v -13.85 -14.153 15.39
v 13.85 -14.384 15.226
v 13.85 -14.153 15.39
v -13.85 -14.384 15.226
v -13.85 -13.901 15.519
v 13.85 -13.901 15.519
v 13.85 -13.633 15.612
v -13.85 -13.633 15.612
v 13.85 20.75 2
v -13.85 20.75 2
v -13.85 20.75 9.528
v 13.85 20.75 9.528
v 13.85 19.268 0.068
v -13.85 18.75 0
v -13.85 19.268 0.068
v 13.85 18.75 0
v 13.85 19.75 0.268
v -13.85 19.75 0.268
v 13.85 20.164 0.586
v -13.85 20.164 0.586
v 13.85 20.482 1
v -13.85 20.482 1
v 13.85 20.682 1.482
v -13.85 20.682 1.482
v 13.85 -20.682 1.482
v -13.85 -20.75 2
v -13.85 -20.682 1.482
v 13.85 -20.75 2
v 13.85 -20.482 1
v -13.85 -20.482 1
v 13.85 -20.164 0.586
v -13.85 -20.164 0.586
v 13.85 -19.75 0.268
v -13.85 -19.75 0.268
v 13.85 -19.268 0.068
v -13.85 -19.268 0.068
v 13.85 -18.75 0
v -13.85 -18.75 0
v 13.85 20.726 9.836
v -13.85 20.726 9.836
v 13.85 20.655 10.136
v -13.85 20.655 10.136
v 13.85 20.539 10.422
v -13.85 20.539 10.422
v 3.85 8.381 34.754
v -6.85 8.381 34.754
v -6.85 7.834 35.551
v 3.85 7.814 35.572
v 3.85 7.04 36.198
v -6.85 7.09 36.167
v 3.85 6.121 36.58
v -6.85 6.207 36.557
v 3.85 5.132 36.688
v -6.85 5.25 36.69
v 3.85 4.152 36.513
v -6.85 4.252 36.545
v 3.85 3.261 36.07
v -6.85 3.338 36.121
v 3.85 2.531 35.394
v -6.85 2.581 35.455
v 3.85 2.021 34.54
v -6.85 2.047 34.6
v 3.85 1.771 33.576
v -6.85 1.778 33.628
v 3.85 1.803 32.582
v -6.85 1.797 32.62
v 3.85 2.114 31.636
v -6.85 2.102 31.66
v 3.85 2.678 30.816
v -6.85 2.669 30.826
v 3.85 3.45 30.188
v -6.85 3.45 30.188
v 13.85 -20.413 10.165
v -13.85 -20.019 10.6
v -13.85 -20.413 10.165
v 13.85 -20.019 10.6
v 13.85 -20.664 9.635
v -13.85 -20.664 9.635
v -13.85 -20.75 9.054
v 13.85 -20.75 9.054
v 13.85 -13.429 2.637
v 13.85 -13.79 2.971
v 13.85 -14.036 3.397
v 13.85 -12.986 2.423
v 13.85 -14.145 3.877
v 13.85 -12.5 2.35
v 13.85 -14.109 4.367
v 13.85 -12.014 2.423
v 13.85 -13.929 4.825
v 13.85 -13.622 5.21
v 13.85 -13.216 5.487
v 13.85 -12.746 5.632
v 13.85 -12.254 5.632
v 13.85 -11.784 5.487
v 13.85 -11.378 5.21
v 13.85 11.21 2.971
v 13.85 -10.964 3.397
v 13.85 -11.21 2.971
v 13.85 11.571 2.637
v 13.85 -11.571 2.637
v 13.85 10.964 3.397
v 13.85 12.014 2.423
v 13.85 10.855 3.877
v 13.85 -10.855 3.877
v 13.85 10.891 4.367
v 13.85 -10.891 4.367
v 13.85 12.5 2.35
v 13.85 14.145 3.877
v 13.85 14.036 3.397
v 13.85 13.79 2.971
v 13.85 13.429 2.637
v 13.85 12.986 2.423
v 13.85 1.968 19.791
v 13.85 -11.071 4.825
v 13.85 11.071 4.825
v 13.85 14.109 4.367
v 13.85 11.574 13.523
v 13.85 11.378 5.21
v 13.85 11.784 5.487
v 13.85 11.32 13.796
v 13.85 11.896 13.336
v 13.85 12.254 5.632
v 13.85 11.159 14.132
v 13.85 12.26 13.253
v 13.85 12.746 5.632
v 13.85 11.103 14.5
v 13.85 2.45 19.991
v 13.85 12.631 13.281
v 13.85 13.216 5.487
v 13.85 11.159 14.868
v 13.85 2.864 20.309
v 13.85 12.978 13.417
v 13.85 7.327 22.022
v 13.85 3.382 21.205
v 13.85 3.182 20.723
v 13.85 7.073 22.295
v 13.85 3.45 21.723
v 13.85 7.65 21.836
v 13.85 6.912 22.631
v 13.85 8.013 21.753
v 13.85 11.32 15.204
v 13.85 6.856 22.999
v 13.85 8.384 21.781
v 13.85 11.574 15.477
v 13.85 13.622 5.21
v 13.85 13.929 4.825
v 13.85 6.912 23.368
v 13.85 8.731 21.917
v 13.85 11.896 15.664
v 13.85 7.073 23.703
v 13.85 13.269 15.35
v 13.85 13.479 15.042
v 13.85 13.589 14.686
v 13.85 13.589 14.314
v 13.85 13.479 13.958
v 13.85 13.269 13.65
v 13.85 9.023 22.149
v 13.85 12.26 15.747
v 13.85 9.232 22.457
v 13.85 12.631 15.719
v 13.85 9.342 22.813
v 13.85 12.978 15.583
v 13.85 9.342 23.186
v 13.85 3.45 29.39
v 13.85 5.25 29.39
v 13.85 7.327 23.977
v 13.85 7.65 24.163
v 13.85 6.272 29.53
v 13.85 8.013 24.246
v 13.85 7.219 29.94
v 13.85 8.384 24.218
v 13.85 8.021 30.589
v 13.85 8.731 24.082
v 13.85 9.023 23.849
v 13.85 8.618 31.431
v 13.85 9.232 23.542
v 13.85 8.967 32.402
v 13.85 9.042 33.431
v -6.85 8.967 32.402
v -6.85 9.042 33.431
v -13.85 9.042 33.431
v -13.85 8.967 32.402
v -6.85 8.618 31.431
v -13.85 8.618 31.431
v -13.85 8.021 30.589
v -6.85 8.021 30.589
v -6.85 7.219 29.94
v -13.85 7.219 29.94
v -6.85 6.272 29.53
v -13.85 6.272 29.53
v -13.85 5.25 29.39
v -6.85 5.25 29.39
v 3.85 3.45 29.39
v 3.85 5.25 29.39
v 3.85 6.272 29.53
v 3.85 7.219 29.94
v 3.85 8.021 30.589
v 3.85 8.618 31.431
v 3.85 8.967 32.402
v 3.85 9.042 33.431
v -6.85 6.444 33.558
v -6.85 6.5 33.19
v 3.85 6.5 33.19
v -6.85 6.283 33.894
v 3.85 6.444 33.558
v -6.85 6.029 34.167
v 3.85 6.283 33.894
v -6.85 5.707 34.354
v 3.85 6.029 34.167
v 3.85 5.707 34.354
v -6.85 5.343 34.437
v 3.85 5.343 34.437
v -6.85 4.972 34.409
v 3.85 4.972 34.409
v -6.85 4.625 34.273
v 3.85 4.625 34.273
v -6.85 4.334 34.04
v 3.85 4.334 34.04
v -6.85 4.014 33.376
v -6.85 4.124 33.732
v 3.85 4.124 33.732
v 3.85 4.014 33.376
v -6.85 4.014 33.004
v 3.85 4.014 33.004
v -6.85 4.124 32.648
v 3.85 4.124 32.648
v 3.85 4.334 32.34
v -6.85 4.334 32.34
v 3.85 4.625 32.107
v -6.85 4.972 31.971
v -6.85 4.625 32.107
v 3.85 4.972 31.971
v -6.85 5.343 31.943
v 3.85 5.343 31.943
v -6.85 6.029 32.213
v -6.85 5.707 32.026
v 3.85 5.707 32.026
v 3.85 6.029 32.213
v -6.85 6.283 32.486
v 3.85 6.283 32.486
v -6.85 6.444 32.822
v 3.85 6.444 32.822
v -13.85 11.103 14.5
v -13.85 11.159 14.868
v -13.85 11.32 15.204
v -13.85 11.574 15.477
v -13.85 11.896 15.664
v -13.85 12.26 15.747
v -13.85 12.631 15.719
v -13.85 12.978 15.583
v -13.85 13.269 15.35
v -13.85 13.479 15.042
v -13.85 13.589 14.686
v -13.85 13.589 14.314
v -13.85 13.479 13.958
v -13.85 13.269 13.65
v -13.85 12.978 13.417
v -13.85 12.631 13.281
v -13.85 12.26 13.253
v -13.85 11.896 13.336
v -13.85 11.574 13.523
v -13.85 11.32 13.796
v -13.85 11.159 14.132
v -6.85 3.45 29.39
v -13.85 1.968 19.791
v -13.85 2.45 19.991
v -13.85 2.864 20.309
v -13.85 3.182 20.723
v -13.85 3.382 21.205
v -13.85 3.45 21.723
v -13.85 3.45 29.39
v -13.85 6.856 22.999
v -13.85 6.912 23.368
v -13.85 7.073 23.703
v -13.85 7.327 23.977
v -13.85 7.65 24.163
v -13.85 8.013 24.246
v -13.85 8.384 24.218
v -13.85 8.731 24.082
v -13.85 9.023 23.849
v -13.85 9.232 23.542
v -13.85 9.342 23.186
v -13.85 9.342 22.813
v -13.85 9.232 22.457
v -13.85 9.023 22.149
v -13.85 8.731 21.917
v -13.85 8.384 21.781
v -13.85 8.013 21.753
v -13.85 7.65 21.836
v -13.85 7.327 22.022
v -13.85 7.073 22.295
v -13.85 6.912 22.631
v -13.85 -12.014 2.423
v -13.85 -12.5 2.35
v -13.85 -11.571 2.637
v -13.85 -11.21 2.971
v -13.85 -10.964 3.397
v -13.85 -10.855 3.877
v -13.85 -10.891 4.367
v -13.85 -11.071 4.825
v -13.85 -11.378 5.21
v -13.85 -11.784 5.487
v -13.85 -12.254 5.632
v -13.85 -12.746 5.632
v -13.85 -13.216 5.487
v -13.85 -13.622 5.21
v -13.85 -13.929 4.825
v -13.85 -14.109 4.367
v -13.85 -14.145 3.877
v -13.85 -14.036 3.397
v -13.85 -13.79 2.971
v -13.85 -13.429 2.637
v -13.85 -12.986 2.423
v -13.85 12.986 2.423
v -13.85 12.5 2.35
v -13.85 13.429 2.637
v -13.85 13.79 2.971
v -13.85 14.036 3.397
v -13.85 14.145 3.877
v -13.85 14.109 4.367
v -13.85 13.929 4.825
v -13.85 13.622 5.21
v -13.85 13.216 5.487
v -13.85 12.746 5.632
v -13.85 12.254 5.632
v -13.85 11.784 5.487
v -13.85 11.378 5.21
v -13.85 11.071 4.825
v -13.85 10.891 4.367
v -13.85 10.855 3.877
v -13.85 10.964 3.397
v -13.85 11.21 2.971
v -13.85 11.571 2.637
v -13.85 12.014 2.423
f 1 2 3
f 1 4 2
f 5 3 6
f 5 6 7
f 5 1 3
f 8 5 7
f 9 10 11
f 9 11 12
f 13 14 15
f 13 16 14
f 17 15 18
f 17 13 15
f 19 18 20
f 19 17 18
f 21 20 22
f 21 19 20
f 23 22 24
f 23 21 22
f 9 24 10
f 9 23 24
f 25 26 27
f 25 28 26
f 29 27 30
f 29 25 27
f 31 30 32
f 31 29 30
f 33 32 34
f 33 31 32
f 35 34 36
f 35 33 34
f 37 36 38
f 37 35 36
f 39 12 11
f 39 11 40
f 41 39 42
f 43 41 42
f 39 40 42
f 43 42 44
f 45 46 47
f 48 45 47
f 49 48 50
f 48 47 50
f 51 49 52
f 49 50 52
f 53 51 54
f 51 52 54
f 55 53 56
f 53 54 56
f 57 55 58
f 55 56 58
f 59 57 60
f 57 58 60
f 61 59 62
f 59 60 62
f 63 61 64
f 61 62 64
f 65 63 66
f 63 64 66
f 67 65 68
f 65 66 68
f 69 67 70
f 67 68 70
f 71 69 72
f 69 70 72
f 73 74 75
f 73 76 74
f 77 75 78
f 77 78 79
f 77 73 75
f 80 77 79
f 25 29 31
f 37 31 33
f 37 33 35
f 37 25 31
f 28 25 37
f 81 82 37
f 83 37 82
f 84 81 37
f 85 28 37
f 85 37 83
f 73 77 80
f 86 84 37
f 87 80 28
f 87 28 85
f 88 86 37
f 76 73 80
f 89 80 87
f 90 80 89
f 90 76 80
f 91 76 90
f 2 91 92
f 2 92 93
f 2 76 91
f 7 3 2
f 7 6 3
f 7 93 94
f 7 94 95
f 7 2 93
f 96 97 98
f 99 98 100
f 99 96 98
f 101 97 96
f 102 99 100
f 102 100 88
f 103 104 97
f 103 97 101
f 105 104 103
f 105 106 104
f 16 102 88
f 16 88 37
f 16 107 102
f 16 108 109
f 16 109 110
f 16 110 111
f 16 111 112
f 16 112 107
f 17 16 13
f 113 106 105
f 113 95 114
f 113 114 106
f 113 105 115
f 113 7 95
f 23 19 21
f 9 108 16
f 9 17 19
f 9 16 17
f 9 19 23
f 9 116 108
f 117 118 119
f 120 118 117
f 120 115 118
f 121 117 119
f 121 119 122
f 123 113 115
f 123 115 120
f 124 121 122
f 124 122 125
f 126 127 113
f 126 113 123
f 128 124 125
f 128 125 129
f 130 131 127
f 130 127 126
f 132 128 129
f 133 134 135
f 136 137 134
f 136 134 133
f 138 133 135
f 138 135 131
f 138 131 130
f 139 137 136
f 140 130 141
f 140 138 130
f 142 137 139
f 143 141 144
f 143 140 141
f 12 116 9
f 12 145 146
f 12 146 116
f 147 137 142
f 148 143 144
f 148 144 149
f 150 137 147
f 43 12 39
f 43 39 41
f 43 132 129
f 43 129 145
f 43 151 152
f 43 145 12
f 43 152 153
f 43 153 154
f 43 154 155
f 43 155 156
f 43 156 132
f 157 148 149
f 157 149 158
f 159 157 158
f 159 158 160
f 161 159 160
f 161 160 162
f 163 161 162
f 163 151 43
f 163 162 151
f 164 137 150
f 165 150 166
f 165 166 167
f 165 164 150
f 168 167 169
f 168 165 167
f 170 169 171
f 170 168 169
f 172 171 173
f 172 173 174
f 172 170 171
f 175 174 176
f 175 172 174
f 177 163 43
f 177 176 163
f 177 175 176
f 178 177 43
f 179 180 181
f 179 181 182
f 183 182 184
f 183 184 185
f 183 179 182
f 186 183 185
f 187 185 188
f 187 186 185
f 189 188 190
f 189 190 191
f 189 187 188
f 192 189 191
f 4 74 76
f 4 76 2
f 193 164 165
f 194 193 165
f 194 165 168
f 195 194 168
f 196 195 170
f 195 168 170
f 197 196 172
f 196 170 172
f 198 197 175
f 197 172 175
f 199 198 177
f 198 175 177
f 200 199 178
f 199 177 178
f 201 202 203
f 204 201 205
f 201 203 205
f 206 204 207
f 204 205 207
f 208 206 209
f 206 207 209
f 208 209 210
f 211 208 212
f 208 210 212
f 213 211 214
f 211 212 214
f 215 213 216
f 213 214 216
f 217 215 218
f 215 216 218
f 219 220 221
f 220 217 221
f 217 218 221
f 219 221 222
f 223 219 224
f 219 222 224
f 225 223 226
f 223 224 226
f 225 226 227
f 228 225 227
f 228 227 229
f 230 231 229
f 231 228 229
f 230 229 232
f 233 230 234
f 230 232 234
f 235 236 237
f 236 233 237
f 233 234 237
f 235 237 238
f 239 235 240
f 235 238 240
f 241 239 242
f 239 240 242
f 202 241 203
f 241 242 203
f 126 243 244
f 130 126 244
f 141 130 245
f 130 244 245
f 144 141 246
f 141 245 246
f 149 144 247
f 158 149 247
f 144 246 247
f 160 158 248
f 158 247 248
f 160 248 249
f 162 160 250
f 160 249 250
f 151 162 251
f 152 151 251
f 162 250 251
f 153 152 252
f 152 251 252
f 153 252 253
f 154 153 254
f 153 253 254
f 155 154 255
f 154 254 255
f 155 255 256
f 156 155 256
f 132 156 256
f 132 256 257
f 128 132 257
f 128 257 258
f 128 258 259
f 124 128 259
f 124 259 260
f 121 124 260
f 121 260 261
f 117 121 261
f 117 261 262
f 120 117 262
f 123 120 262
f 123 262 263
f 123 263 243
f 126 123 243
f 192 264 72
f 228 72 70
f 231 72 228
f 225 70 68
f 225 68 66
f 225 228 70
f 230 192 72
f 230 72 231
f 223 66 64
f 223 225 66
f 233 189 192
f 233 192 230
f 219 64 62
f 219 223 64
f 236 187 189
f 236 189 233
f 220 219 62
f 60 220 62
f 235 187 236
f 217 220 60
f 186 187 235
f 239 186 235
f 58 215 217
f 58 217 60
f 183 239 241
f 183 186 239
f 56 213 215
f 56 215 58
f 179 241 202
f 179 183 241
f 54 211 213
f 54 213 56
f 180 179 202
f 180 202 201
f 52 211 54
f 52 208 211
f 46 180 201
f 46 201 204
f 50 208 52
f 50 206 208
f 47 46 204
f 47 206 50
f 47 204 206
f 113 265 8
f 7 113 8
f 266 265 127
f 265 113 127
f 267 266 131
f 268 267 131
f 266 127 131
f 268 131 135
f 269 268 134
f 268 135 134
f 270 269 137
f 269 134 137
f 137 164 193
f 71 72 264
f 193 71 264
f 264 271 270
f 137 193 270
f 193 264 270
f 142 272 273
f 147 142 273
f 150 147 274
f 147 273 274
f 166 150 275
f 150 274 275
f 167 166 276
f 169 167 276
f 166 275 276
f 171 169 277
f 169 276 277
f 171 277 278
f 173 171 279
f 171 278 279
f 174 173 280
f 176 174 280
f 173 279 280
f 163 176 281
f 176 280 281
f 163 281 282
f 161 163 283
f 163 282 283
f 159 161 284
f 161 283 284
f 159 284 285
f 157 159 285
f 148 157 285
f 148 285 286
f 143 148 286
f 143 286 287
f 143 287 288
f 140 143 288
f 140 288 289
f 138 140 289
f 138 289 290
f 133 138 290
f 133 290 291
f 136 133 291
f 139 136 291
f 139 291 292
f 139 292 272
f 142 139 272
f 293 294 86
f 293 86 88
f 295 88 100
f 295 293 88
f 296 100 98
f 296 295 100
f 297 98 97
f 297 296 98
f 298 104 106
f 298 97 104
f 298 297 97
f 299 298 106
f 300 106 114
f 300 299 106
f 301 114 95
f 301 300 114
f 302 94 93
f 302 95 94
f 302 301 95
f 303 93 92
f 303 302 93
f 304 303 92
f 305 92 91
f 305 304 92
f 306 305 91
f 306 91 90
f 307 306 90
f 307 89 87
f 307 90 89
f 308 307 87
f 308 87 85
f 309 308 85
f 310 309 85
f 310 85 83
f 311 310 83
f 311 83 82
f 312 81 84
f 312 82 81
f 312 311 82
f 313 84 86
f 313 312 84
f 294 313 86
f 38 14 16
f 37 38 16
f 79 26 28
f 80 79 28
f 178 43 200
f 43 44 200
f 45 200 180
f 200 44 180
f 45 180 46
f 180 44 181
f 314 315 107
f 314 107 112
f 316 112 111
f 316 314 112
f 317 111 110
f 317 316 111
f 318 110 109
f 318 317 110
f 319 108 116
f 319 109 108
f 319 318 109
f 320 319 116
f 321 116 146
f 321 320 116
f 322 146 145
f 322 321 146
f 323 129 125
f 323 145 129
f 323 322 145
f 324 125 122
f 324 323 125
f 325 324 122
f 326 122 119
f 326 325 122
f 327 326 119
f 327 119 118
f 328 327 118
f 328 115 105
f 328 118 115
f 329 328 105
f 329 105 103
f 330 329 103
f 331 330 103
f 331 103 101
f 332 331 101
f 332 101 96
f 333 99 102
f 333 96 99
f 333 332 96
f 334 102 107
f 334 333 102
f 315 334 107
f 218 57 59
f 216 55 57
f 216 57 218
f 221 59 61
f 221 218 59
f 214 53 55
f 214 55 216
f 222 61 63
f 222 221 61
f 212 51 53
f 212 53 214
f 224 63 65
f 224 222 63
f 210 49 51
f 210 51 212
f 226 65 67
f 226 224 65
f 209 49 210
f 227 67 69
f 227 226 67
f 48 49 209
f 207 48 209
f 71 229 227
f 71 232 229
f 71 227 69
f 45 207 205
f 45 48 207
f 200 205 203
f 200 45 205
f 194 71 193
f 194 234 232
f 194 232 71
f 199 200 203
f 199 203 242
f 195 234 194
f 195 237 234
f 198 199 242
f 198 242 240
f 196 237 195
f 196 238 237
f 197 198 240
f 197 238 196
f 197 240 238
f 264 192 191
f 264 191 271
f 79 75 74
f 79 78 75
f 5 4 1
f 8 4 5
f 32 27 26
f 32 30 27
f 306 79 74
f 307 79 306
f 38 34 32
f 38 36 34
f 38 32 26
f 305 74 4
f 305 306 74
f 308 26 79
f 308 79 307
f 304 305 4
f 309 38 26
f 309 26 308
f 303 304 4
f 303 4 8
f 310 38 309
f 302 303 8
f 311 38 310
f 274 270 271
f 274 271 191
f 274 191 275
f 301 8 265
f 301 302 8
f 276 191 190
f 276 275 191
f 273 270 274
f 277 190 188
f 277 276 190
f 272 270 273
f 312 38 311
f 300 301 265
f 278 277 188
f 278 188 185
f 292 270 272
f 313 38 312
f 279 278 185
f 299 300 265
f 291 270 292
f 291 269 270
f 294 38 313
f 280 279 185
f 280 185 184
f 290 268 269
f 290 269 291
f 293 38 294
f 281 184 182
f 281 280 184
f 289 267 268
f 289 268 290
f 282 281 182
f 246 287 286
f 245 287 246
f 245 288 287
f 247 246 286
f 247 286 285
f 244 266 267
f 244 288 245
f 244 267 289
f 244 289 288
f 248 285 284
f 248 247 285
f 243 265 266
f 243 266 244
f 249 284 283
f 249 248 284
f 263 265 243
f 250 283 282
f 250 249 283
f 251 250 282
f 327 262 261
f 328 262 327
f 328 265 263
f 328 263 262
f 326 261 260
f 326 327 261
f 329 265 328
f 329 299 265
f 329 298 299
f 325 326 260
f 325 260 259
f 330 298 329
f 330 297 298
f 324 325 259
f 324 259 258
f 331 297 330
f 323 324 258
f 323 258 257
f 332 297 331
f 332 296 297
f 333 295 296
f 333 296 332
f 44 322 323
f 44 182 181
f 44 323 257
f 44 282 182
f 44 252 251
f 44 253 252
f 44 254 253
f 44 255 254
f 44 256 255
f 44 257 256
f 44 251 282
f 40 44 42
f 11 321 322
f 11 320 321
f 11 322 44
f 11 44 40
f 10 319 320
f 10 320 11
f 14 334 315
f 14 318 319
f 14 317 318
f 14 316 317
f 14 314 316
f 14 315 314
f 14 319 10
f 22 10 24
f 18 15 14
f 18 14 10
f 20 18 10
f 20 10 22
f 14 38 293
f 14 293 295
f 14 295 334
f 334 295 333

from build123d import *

# Parameters (mm, degrees)
SKETCH1_W                       = 27.7
SKETCH1_H                       = 41.5
BOSS_EXTRUDE1_DEPTH             = 10
CUT_EXTRUDE2_DEPTH              = 27.877220838
CUT_EXTRUDE2_DEPTH_BACK         = 27.877220838
SKETCH2_R                       = 1.65
BOSS_EXTRUDE2_REACH             = 28.877
SKETCH3_R                       = 1.25
BOSS_EXTRUDE2_DIRECTION_2_REACH = 28.877
CUT_EXTRUDE3_START              = -7
SKETCH4_R                       = 1.25
CUT_EXTRUDE3_DEPTH              = 7
SKETCH6_R                       = 1.25
CUT_EXTRUDE5_DEPTH              = 10
SKETCH5_R                       = 1.25
CUT_EXTRUDE4_DEPTH              = 51.438166105
FILLET1_R                       = 2


with BuildPart() as part:
    # Sketch1 → Boss-Extrude1 (new body)
    with BuildSketch(Plane.XY):
        Rectangle(SKETCH1_W, SKETCH1_H)
    extrude(amount=BOSS_EXTRUDE1_DEPTH)

    # Sketch2 → Cut-Extrude2 (cut, two sides: drawn at the far end of the back side and taken through both)
    with BuildSketch(Plane(origin=(0, 0, 0), x_dir=(0, 0, -1), z_dir=(1, 0, 0)).offset(-CUT_EXTRUDE2_DEPTH_BACK)):
        with Locations((-4, 12.5)):
            Circle(SKETCH2_R)
        with Locations((-4, -12.5)):
            Circle(SKETCH2_R)
    extrude(amount=CUT_EXTRUDE2_DEPTH + CUT_EXTRUDE2_DEPTH_BACK, mode=Mode.SUBTRACT)

    # Boss-Extrude2: up to this face of the body (flat: up to its plane)
    boss_extrude2_end = Plane(part.part.faces().sort_by_distance((-13.85, 0, 5.042991276))[0])
    # Sketch3 → Boss-Extrude2 (add, up to the picked face)
    with BuildSketch(Plane(origin=(0, 0, 0), x_dir=(0, 0, -1), z_dir=(1, 0, 0)), mode=Mode.PRIVATE) as boss_extrude2_sk1:
        Polygon((-15.5, -14.05), (-10, -14.05), (-10, 3.45), (-20.188333796, 3.45), align=None)
    boss_extrude2_tool1 = split(extrude(boss_extrude2_sk1.sketch, amount=-BOSS_EXTRUDE2_REACH, mode=Mode.PRIVATE), bisect_by=boss_extrude2_end, keep=Keep.BOTH, mode=Mode.PRIVATE)
    # Sketch3 → Boss-Extrude2 (add, up to the picked face)
    with BuildSketch(Plane(origin=(0, 0, 0), x_dir=(0, 0, -1), z_dir=(1, 0, 0)), mode=Mode.PRIVATE) as boss_extrude2_sk2:
        with BuildLine():
            Line((-20.188333796, 3.45), (-10, 3.45))
            Line((-10, 3.45), (-10, 20.75))
            Line((-10, 20.75), (-34.754426044, 8.380905804))
            ThreePointArc((-34.754426044, 8.380905804), (-35.758048448, 2.871948872), (-30.188333796, 3.45))
            Line((-30.188333796, 3.45), (-20.188333796, 3.45))
        make_face()
        with Locations(Location((-33.19, 5.25, 0), (0, 0, 90))):
            Circle(SKETCH3_R, mode=Mode.SUBTRACT)
    boss_extrude2_tool2 = split(extrude(boss_extrude2_sk2.sketch, amount=-BOSS_EXTRUDE2_REACH, mode=Mode.PRIVATE), bisect_by=boss_extrude2_end, keep=Keep.BOTH, mode=Mode.PRIVATE)
    # Sketch3 → Boss-Extrude2 (add, up to the picked face)
    with BuildSketch(Plane(origin=(0, 0, 0), x_dir=(0, 0, -1), z_dir=(1, 0, 0)), mode=Mode.PRIVATE) as boss_extrude2_sk3:
        Polygon((-10, -14.05), (-10, -20.75), (-15.5, -14.05), align=None)
    boss_extrude2_tool3 = split(extrude(boss_extrude2_sk3.sketch, amount=-BOSS_EXTRUDE2_REACH, mode=Mode.PRIVATE), bisect_by=boss_extrude2_end, keep=Keep.BOTH, mode=Mode.PRIVATE)
    add(boss_extrude2_tool1.solids().sort_by(Axis((0, -4.428377, 14.038839), (-1, 0, 0)))[0])
    add(boss_extrude2_tool2.solids().sort_by(Axis((0, 9.377547, 20.597774), (-1, 0, 0)))[0])
    add(boss_extrude2_tool3.solids().sort_by(Axis((0, -16.283333, 11.833333), (-1, 0, 0)))[0])

    # Boss-Extrude2 direction 2: up to this face of the body (flat: up to its plane)
    boss_extrude2_direction_2_end = Plane(part.part.faces().sort_by_distance((13.85, 0, 5.042991276))[0])
    # Sketch3 → Boss-Extrude2 direction 2 (add, up to the picked face)
    with BuildSketch(Plane(origin=(0, 0, 0), x_dir=(0, 0, -1), z_dir=(1, 0, 0)), mode=Mode.PRIVATE) as boss_extrude2_direction_2_sk1:
        Polygon((-15.5, -14.05), (-10, -14.05), (-10, 3.45), (-20.188333796, 3.45), align=None)
    boss_extrude2_direction_2_tool1 = split(extrude(boss_extrude2_direction_2_sk1.sketch, amount=BOSS_EXTRUDE2_DIRECTION_2_REACH, mode=Mode.PRIVATE), bisect_by=boss_extrude2_direction_2_end, keep=Keep.BOTH, mode=Mode.PRIVATE)
    # Sketch3 → Boss-Extrude2 direction 2 (add, up to the picked face)
    with BuildSketch(Plane(origin=(0, 0, 0), x_dir=(0, 0, -1), z_dir=(1, 0, 0)), mode=Mode.PRIVATE) as boss_extrude2_direction_2_sk2:
        with BuildLine():
            Line((-20.188333796, 3.45), (-10, 3.45))
            Line((-10, 3.45), (-10, 20.75))
            Line((-10, 20.75), (-34.754426044, 8.380905804))
            ThreePointArc((-34.754426044, 8.380905804), (-35.758048448, 2.871948872), (-30.188333796, 3.45))
            Line((-30.188333796, 3.45), (-20.188333796, 3.45))
        make_face()
        with Locations(Location((-33.19, 5.25, 0), (0, 0, 90))):
            Circle(SKETCH3_R, mode=Mode.SUBTRACT)
    boss_extrude2_direction_2_tool2 = split(extrude(boss_extrude2_direction_2_sk2.sketch, amount=BOSS_EXTRUDE2_DIRECTION_2_REACH, mode=Mode.PRIVATE), bisect_by=boss_extrude2_direction_2_end, keep=Keep.BOTH, mode=Mode.PRIVATE)
    # Sketch3 → Boss-Extrude2 direction 2 (add, up to the picked face)
    with BuildSketch(Plane(origin=(0, 0, 0), x_dir=(0, 0, -1), z_dir=(1, 0, 0)), mode=Mode.PRIVATE) as boss_extrude2_direction_2_sk3:
        Polygon((-10, -14.05), (-10, -20.75), (-15.5, -14.05), align=None)
    boss_extrude2_direction_2_tool3 = split(extrude(boss_extrude2_direction_2_sk3.sketch, amount=BOSS_EXTRUDE2_DIRECTION_2_REACH, mode=Mode.PRIVATE), bisect_by=boss_extrude2_direction_2_end, keep=Keep.BOTH, mode=Mode.PRIVATE)
    add(boss_extrude2_direction_2_tool1.solids().sort_by(Axis((0, -4.428377, 14.038839), (1, 0, 0)))[0])
    add(boss_extrude2_direction_2_tool2.solids().sort_by(Axis((0, 9.377547, 20.597774), (1, 0, 0)))[0])
    add(boss_extrude2_direction_2_tool3.solids().sort_by(Axis((0, -16.283333, 11.833333), (1, 0, 0)))[0])

    # Sketch4 → Cut-Extrude3 (cut)
    # profile 1 of 5: a face of its own
    with BuildSketch(Plane.ZY.offset(13.85).offset(CUT_EXTRUDE3_START)):
        with BuildLine():
            ThreePointArc((34.754426044, 8.380905804), (30.621951552, 7.628051128), (30.188333796, 3.45))
            ThreePointArc((30.188333796, 3.45), (34.123854455, 1.876883361), (36.69, 5.25))
            ThreePointArc((36.69, 5.25), (36.167036375, 7.090449517), (34.754426044, 8.380905804))
        make_face()
        with Locations(Location((33.19, 5.25, 0), (0, 0, 270))):
            Circle(SKETCH4_R, mode=Mode.SUBTRACT)
    # profile 2 of 5: a face of its own
    with BuildSketch(Plane.ZY.offset(13.85).offset(CUT_EXTRUDE3_START)):
        with BuildLine():
            ThreePointArc((29.39, 5.25), (29.505082606, 4.321892356), (29.843359894, 3.45))
            Line((29.843359894, 3.45), (30.188333796, 3.45))
            ThreePointArc((30.188333796, 3.45), (30.621951552, 7.628051128), (34.754426044, 8.380905804))
            Line((34.754426044, 8.380905804), (33.430621051, 9.042374126))
            ThreePointArc((33.430621051, 9.042374126), (30.589457748, 8.020772455), (29.39, 5.25))
        make_face()
    # profile 3 of 5: a face of its own
    with BuildSketch(Plane.ZY.offset(13.85).offset(CUT_EXTRUDE3_START)):
        with BuildLine():
            Line((30.188333796, 3.45), (29.843359894, 3.45))
            ThreePointArc((29.843359894, 3.45), (34.118107644, 1.565082606), (36.99, 5.25))
            ThreePointArc((36.99, 5.25), (35.960772455, 7.850542252), (33.430621051, 9.042374126))
            Line((33.430621051, 9.042374126), (34.754426044, 8.380905804))
            ThreePointArc((34.754426044, 8.380905804), (36.167036375, 7.090449517), (36.69, 5.25))
            ThreePointArc((36.69, 5.25), (34.123854455, 1.876883361), (30.188333796, 3.45))
        make_face()
    # profile 4 of 5: a face of its own
    with BuildSketch(Plane.ZY.offset(13.85).offset(CUT_EXTRUDE3_START)):
        with BuildLine():
            Line((30.188333796, 3.45), (29.843359894, 3.45))
            ThreePointArc((29.843359894, 3.45), (34.118107644, 1.565082606), (36.99, 5.25))
            ThreePointArc((36.99, 5.25), (35.960772455, 7.850542252), (33.430621051, 9.042374126))
            Line((33.430621051, 9.042374126), (34.754426044, 8.380905804))
            ThreePointArc((34.754426044, 8.380905804), (36.167036375, 7.090449517), (36.69, 5.25))
            ThreePointArc((36.69, 5.25), (34.123854455, 1.876883361), (30.188333796, 3.45))
        make_face()
    # profile 5 of 5: a face of its own
    with BuildSketch(Plane.ZY.offset(13.85).offset(CUT_EXTRUDE3_START)):
        with BuildLine():
            Line((29.39, 5.25), (29.39, 3.45))
            Line((29.39, 3.45), (29.843359894, 3.45))
            ThreePointArc((29.843359894, 3.45), (29.505082606, 4.321892356), (29.39, 5.25))
        make_face()
    extrude(amount=CUT_EXTRUDE3_DEPTH, mode=Mode.SUBTRACT)

    # Sketch6 → Cut-Extrude5 (cut)
    # profile 1 of 3: a face of its own
    with BuildSketch(Plane(origin=(13.85, 0, 0), x_dir=(0, 0, -1), z_dir=(1, 0, 0))):
        with BuildLine():
            ThreePointArc((-33.430621051, 9.042374126), (-36.388515387, 3.19829356), (-29.843359894, 3.45))
            Line((-29.843359894, 3.45), (-30.188333796, 3.45))
            ThreePointArc((-30.188333796, 3.45), (-35.758048448, 2.871948872), (-34.754426044, 8.380905804))
            Line((-34.754426044, 8.380905804), (-33.430621051, 9.042374126))
        make_face()
    # profile 2 of 3: a face of its own
    with BuildSketch(Plane(origin=(13.85, 0, 0), x_dir=(0, 0, -1), z_dir=(1, 0, 0))):
        with BuildLine():
            Line((-30.188333796, 3.45), (-29.843359894, 3.45))
            ThreePointArc((-29.843359894, 3.45), (-29.505082606, 4.321892356), (-29.39, 5.25))
            ThreePointArc((-29.39, 5.25), (-30.589457748, 8.020772455), (-33.430621051, 9.042374126))
            Line((-33.430621051, 9.042374126), (-34.754426044, 8.380905804))
            ThreePointArc((-34.754426044, 8.380905804), (-35.758048448, 2.871948872), (-30.188333796, 3.45))
        make_face()
        with Locations(Location((-33.19, 5.25, 0), (0, 0, 90))):
            Circle(SKETCH6_R, mode=Mode.SUBTRACT)
    # profile 3 of 3: a face of its own
    with BuildSketch(Plane(origin=(13.85, 0, 0), x_dir=(0, 0, -1), z_dir=(1, 0, 0))):
        with BuildLine():
            Line((-29.843359894, 3.45), (-29.39, 3.45))
            Line((-29.39, 3.45), (-29.39, 5.25))
            ThreePointArc((-29.39, 5.25), (-29.505082606, 4.321892356), (-29.843359894, 3.45))
        make_face()
    extrude(amount=-CUT_EXTRUDE5_DEPTH, mode=Mode.SUBTRACT)

    # Sketch5 → Cut-Extrude4 (cut, through all)
    with BuildSketch(Plane.ZY.offset(13.85)):
        with Locations(Location((14.5, 12.353095448, 0), (0, 0, 270))):
            Circle(SKETCH5_R)
        with Locations(Location((22.999243301, 8.106261334, 0), (0, 0, 270))):
            Circle(SKETCH5_R)
    extrude(amount=-CUT_EXTRUDE4_DEPTH, mode=Mode.SUBTRACT)

    # Fillet1
    fillet1_edges = [part.edges().sort_by_distance(p)[0] for p in [
        (0, 20.75, 10),
        (0, 3.45, 20.188333796),
        (0, -14.05, 15.5),
        (0, 20.75, 0),
        (0, -20.75, 0),
        (0, -20.75, 10),
    ]]
    fillet(fillet1_edges, radius=FILLET1_R)


solid = part.part
